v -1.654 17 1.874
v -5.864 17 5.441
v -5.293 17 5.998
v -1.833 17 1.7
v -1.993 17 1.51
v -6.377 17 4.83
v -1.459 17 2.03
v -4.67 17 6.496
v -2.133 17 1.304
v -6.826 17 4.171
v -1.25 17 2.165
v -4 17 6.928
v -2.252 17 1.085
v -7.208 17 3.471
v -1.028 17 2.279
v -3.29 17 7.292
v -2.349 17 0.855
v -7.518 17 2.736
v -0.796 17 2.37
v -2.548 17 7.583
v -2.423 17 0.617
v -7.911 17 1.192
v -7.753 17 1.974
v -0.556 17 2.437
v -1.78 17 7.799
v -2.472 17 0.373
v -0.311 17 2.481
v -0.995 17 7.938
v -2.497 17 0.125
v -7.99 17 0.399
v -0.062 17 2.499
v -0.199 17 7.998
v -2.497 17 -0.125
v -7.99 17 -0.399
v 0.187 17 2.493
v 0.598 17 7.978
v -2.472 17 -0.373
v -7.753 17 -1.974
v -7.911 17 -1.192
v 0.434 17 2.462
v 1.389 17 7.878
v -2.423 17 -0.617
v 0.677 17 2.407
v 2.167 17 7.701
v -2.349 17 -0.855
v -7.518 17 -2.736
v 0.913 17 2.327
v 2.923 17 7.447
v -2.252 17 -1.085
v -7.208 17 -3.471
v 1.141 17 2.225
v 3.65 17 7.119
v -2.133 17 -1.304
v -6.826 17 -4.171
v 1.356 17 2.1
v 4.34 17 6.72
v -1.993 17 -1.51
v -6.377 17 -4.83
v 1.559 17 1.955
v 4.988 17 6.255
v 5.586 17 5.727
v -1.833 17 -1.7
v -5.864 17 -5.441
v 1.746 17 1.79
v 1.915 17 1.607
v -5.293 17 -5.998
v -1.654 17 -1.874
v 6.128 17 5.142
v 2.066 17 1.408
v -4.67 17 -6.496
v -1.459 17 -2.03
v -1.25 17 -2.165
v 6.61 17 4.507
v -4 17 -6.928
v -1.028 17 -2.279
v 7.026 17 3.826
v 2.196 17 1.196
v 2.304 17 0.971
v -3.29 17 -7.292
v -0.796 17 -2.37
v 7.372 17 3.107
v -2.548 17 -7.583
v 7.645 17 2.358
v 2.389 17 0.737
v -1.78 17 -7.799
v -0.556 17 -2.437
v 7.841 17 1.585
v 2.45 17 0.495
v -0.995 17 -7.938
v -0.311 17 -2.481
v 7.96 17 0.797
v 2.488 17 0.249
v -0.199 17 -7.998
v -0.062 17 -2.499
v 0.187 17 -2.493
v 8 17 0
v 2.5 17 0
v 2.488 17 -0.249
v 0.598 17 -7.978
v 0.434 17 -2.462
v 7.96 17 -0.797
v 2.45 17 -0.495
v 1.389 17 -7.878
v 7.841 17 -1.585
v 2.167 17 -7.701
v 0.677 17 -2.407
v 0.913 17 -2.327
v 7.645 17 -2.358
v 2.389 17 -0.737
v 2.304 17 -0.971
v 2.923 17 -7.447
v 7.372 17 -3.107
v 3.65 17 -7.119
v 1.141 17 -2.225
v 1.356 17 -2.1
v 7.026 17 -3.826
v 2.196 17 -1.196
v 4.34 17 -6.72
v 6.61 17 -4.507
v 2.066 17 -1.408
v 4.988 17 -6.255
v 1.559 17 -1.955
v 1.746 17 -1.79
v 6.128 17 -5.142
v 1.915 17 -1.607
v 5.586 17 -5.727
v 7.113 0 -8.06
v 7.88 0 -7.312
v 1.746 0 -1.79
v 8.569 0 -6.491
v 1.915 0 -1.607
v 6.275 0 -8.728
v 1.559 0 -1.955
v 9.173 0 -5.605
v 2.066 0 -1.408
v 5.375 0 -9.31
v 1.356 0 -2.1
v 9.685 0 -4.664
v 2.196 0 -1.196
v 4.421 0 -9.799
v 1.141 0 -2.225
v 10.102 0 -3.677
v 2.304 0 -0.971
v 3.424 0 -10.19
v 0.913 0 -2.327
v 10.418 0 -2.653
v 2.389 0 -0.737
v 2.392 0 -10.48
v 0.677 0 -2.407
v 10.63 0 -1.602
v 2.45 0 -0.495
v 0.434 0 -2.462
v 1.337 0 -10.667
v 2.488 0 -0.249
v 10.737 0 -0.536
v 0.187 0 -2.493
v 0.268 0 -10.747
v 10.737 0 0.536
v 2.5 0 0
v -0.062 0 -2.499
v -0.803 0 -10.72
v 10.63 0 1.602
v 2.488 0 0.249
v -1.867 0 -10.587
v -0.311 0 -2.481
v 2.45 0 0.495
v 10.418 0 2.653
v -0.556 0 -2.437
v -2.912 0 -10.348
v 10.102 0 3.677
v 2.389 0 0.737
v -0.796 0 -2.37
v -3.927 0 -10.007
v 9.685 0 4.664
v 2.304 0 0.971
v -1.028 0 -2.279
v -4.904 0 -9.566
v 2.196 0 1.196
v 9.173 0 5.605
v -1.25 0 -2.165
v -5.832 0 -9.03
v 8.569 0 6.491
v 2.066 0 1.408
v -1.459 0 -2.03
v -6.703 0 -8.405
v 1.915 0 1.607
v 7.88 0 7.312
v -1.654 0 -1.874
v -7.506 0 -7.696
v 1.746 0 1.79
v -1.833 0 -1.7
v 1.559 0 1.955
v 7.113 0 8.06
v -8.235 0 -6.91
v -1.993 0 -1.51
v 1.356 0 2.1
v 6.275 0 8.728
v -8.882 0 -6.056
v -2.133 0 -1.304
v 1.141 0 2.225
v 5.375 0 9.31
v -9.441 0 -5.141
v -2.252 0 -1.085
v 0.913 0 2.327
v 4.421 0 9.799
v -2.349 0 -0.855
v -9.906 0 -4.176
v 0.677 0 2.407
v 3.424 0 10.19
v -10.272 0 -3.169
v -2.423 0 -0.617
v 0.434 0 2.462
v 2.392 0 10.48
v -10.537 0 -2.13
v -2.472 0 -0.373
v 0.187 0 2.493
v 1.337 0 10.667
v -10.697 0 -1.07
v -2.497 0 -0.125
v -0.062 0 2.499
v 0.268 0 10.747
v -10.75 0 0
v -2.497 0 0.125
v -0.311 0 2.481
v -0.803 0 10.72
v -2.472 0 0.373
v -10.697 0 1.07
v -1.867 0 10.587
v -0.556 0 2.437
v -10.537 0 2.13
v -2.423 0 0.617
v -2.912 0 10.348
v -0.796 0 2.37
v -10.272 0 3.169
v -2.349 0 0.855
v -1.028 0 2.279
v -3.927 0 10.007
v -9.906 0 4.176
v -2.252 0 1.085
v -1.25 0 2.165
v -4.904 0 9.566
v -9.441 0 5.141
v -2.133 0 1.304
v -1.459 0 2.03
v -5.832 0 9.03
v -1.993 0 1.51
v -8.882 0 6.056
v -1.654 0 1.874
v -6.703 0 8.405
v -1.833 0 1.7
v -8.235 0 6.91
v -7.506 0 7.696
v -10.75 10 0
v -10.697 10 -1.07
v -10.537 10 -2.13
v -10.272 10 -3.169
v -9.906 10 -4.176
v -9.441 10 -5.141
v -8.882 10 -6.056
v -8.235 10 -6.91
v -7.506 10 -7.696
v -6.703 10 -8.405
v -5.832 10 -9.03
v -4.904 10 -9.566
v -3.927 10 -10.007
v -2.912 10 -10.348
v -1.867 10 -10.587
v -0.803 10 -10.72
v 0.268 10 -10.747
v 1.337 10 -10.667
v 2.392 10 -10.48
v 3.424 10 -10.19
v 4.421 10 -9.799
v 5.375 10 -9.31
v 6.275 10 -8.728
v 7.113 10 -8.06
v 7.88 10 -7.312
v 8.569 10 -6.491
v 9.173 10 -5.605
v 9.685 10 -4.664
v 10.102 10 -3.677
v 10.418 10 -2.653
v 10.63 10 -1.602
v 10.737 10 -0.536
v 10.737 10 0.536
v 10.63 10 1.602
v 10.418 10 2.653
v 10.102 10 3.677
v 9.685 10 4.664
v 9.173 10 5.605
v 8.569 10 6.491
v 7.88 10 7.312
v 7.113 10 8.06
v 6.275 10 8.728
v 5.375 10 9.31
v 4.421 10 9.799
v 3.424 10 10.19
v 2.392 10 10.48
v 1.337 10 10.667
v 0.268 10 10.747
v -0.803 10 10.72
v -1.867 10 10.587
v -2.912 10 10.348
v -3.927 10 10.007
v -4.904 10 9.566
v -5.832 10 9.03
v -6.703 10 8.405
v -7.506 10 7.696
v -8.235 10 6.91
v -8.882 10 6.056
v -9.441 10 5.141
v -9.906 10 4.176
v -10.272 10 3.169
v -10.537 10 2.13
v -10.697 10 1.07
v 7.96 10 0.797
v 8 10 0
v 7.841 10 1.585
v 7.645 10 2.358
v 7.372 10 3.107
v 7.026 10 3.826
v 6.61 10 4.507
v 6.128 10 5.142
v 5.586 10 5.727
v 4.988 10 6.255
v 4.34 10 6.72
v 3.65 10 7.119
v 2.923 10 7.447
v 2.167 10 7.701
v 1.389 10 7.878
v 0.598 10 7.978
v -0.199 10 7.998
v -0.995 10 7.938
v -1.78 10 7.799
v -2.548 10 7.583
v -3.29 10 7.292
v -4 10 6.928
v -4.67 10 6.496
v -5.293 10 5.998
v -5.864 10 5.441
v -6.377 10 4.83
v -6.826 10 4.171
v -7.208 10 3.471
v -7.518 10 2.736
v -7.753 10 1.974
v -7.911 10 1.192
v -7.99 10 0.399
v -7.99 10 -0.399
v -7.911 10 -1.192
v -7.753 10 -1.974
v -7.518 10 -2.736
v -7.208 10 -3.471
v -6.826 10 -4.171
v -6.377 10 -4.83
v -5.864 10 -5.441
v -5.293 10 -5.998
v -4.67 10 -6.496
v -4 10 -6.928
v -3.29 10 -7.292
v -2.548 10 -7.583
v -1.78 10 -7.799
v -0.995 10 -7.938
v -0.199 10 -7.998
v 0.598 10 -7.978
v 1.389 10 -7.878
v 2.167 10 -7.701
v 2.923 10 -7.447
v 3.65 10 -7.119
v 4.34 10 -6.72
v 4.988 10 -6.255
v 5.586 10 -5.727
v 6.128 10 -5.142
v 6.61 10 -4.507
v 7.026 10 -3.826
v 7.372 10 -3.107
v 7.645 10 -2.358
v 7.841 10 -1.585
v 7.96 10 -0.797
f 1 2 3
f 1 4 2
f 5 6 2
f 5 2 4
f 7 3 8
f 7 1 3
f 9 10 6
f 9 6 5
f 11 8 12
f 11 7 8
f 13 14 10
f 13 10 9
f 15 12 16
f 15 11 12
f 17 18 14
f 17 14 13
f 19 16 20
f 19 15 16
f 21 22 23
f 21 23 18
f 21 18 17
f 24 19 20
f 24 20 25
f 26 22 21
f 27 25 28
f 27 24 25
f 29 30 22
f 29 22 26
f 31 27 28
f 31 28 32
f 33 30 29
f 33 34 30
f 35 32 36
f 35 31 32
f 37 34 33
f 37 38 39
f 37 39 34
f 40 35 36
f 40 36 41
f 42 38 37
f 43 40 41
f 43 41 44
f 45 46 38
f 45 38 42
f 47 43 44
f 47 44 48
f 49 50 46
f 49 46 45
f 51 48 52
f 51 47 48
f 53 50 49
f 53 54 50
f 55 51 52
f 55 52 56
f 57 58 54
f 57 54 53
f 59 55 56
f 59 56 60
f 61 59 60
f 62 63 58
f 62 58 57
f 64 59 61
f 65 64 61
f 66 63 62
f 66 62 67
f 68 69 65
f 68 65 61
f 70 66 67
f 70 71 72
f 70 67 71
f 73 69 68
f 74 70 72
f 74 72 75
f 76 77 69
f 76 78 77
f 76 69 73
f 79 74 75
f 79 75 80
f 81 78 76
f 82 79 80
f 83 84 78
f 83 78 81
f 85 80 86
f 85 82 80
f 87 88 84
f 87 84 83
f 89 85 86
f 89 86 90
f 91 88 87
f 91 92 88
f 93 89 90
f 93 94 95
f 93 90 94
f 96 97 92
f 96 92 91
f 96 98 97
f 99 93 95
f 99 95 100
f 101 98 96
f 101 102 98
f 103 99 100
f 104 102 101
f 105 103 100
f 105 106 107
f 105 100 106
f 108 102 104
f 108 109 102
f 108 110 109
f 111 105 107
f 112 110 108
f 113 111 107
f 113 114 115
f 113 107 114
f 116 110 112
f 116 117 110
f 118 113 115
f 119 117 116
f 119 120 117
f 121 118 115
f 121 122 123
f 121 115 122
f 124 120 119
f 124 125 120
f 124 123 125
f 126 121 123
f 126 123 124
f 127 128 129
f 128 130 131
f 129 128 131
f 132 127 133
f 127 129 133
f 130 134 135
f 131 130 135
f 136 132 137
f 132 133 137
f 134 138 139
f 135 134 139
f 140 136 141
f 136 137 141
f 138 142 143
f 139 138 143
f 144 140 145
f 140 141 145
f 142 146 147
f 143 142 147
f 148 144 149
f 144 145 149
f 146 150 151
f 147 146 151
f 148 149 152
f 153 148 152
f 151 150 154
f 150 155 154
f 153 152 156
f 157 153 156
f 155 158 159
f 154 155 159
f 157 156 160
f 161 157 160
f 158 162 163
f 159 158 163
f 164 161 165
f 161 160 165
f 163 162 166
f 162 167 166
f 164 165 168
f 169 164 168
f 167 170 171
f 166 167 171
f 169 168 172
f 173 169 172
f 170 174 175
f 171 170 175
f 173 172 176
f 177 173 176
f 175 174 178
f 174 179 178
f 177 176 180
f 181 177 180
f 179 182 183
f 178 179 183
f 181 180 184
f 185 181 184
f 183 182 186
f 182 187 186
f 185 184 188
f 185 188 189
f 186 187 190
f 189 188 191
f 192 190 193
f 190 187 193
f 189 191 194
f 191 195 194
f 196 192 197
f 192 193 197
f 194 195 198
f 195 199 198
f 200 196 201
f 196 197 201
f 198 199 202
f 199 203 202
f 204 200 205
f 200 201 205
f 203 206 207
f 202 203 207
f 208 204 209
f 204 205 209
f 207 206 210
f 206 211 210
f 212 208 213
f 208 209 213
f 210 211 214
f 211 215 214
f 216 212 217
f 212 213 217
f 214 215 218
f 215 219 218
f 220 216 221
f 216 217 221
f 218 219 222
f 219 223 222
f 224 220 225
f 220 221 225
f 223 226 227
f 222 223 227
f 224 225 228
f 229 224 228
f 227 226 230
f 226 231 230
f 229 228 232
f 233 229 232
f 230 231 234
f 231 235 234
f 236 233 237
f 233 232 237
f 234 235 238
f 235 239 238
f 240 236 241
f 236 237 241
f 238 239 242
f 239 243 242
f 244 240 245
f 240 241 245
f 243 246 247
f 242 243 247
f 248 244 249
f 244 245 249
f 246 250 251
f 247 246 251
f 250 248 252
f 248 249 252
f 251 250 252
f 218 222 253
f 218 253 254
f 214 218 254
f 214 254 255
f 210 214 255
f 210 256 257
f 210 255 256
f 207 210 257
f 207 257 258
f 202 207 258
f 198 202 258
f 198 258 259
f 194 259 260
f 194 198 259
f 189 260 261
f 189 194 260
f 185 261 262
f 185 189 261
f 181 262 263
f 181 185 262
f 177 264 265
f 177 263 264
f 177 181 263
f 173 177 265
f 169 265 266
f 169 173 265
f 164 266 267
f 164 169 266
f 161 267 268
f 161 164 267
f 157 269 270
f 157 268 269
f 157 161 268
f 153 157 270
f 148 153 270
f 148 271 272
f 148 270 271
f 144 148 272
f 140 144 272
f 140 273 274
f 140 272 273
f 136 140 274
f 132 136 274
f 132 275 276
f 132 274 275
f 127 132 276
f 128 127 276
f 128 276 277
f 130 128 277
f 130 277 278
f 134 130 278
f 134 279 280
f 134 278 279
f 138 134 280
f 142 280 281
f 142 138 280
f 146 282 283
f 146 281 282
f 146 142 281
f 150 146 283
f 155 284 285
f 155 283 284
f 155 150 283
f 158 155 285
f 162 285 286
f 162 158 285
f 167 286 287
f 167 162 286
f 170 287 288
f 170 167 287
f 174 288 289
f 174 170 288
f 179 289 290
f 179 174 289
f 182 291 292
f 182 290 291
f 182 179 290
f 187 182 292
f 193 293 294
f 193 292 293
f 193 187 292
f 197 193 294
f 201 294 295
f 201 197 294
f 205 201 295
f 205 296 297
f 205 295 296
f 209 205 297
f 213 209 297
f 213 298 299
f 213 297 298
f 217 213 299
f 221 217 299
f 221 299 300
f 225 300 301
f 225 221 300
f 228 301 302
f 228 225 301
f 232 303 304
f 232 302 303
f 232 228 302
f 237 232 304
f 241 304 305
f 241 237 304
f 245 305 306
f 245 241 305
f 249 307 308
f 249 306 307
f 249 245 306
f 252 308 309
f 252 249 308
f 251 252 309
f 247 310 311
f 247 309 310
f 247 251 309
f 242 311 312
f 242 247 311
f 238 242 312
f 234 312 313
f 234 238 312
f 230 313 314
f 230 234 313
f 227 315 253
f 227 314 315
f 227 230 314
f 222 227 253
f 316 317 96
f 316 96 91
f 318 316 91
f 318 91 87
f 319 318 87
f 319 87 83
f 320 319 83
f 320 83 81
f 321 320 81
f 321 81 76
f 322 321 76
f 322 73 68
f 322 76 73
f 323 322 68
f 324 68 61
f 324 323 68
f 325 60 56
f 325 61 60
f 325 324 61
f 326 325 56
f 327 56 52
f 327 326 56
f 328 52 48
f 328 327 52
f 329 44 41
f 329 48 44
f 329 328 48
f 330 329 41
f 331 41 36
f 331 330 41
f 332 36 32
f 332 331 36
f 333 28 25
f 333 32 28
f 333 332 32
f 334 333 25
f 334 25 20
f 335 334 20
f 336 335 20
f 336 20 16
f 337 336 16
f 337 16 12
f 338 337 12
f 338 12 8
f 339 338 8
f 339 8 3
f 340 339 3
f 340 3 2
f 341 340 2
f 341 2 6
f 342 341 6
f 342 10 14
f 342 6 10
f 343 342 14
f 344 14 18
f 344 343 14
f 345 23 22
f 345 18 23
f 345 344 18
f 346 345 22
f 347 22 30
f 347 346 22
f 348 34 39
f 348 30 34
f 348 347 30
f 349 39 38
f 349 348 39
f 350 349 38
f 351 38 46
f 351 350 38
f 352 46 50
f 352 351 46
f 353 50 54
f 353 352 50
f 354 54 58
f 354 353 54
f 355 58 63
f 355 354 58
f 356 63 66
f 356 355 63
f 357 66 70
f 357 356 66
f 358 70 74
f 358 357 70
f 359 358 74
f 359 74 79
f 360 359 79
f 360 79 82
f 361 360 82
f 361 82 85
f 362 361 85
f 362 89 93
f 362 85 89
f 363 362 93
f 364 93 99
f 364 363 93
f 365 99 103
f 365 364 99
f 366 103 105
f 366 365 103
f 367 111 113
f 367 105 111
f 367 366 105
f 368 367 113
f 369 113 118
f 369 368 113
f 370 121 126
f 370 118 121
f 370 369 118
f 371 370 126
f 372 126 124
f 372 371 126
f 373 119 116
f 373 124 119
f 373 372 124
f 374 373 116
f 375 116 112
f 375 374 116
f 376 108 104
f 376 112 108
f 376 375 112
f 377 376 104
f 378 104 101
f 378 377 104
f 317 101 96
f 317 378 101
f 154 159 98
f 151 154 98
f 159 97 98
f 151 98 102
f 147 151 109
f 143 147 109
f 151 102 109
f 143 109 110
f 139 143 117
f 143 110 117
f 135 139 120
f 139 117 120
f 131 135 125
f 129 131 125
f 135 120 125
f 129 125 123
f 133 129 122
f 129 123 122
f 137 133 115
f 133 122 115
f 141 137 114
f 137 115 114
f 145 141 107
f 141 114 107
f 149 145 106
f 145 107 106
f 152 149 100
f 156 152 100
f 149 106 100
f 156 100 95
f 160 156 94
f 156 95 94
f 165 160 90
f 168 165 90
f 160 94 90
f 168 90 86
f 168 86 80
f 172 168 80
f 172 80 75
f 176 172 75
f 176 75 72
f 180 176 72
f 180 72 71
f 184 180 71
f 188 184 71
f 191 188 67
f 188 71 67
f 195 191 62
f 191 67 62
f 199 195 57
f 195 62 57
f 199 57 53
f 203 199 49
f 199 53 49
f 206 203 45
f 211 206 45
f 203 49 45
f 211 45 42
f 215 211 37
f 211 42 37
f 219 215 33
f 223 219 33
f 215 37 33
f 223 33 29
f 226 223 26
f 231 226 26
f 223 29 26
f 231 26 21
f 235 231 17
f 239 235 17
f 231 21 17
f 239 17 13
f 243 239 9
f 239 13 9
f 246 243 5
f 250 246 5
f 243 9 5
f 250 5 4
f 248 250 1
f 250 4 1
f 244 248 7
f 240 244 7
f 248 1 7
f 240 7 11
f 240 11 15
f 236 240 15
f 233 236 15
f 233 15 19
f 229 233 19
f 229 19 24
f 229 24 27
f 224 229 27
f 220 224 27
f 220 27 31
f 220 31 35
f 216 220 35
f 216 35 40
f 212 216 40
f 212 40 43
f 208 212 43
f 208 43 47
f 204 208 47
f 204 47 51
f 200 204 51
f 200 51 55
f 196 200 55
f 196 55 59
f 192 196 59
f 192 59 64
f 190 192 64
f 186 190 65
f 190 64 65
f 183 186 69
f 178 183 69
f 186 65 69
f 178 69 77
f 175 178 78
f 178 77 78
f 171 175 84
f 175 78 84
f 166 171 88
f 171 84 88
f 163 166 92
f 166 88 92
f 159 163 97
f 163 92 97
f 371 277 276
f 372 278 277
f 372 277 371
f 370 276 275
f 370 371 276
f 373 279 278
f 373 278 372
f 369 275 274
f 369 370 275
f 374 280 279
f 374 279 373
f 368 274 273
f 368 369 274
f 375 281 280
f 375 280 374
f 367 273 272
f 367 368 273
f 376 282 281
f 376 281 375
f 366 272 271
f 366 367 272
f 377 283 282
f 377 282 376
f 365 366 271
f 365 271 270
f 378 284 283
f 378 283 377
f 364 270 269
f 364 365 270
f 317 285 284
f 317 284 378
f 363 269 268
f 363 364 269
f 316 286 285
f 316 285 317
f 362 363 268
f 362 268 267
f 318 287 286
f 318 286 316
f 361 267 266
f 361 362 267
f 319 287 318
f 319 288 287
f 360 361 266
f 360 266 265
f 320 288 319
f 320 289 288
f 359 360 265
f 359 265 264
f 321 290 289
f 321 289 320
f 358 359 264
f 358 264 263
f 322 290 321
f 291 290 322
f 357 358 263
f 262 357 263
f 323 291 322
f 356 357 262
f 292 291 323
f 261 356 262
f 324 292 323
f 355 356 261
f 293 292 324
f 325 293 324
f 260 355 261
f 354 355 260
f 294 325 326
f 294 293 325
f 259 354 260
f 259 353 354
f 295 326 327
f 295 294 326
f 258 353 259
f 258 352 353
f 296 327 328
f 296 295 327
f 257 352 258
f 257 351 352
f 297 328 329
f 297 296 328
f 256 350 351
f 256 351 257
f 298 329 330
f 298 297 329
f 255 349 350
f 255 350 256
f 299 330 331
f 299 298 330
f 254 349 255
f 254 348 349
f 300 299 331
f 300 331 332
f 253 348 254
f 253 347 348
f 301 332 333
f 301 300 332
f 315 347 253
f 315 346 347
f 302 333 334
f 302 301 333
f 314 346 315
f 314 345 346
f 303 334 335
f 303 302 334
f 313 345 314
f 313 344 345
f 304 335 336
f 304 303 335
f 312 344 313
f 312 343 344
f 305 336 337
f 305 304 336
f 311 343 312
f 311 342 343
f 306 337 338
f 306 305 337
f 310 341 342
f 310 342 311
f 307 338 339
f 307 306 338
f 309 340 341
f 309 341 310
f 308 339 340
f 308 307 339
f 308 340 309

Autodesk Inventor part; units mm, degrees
ref_plane "YZ Plane" through (0, 0, 0) normal (1, 0, 0) x (0, 1, 0)
ref_plane "XZ Plane" through (0, 0, 0) normal (0, 1, 0) x (-1, 0, 0)
ref_plane "XY Plane" through (0, 0, 0) normal (0, 0, 1) x (1, 0, 0)
sketch "Sketch1" plane through (0, 0, 0) normal (0, 1, 0) x (-1, 0, 0)
  circle A0 centre (0, 0) radius 10.75
  dimension "d0" = 21.5
extrude "Extrusion1" add sketch "Sketch1" along normal blind 10
sketch "Sketch2" plane through (0, 10, 0) normal (0, 1, 0) x (1, 0, 0)
  circle A0 centre (0, 0) radius 8
  dimension "d3" = 16
extrude "Extrusion2" add sketch "Sketch2" along normal blind 7
sketch "Sketch3" plane through (0, 17, 0) normal (0, 1, 0) x (1, 0, 0)
  circle A0 centre (0, 0) radius 2.5
  dimension "d6" = 5
extrude "Extrusion3" cut sketch "Sketch3" against normal through all
properties part number "Gear drive"
